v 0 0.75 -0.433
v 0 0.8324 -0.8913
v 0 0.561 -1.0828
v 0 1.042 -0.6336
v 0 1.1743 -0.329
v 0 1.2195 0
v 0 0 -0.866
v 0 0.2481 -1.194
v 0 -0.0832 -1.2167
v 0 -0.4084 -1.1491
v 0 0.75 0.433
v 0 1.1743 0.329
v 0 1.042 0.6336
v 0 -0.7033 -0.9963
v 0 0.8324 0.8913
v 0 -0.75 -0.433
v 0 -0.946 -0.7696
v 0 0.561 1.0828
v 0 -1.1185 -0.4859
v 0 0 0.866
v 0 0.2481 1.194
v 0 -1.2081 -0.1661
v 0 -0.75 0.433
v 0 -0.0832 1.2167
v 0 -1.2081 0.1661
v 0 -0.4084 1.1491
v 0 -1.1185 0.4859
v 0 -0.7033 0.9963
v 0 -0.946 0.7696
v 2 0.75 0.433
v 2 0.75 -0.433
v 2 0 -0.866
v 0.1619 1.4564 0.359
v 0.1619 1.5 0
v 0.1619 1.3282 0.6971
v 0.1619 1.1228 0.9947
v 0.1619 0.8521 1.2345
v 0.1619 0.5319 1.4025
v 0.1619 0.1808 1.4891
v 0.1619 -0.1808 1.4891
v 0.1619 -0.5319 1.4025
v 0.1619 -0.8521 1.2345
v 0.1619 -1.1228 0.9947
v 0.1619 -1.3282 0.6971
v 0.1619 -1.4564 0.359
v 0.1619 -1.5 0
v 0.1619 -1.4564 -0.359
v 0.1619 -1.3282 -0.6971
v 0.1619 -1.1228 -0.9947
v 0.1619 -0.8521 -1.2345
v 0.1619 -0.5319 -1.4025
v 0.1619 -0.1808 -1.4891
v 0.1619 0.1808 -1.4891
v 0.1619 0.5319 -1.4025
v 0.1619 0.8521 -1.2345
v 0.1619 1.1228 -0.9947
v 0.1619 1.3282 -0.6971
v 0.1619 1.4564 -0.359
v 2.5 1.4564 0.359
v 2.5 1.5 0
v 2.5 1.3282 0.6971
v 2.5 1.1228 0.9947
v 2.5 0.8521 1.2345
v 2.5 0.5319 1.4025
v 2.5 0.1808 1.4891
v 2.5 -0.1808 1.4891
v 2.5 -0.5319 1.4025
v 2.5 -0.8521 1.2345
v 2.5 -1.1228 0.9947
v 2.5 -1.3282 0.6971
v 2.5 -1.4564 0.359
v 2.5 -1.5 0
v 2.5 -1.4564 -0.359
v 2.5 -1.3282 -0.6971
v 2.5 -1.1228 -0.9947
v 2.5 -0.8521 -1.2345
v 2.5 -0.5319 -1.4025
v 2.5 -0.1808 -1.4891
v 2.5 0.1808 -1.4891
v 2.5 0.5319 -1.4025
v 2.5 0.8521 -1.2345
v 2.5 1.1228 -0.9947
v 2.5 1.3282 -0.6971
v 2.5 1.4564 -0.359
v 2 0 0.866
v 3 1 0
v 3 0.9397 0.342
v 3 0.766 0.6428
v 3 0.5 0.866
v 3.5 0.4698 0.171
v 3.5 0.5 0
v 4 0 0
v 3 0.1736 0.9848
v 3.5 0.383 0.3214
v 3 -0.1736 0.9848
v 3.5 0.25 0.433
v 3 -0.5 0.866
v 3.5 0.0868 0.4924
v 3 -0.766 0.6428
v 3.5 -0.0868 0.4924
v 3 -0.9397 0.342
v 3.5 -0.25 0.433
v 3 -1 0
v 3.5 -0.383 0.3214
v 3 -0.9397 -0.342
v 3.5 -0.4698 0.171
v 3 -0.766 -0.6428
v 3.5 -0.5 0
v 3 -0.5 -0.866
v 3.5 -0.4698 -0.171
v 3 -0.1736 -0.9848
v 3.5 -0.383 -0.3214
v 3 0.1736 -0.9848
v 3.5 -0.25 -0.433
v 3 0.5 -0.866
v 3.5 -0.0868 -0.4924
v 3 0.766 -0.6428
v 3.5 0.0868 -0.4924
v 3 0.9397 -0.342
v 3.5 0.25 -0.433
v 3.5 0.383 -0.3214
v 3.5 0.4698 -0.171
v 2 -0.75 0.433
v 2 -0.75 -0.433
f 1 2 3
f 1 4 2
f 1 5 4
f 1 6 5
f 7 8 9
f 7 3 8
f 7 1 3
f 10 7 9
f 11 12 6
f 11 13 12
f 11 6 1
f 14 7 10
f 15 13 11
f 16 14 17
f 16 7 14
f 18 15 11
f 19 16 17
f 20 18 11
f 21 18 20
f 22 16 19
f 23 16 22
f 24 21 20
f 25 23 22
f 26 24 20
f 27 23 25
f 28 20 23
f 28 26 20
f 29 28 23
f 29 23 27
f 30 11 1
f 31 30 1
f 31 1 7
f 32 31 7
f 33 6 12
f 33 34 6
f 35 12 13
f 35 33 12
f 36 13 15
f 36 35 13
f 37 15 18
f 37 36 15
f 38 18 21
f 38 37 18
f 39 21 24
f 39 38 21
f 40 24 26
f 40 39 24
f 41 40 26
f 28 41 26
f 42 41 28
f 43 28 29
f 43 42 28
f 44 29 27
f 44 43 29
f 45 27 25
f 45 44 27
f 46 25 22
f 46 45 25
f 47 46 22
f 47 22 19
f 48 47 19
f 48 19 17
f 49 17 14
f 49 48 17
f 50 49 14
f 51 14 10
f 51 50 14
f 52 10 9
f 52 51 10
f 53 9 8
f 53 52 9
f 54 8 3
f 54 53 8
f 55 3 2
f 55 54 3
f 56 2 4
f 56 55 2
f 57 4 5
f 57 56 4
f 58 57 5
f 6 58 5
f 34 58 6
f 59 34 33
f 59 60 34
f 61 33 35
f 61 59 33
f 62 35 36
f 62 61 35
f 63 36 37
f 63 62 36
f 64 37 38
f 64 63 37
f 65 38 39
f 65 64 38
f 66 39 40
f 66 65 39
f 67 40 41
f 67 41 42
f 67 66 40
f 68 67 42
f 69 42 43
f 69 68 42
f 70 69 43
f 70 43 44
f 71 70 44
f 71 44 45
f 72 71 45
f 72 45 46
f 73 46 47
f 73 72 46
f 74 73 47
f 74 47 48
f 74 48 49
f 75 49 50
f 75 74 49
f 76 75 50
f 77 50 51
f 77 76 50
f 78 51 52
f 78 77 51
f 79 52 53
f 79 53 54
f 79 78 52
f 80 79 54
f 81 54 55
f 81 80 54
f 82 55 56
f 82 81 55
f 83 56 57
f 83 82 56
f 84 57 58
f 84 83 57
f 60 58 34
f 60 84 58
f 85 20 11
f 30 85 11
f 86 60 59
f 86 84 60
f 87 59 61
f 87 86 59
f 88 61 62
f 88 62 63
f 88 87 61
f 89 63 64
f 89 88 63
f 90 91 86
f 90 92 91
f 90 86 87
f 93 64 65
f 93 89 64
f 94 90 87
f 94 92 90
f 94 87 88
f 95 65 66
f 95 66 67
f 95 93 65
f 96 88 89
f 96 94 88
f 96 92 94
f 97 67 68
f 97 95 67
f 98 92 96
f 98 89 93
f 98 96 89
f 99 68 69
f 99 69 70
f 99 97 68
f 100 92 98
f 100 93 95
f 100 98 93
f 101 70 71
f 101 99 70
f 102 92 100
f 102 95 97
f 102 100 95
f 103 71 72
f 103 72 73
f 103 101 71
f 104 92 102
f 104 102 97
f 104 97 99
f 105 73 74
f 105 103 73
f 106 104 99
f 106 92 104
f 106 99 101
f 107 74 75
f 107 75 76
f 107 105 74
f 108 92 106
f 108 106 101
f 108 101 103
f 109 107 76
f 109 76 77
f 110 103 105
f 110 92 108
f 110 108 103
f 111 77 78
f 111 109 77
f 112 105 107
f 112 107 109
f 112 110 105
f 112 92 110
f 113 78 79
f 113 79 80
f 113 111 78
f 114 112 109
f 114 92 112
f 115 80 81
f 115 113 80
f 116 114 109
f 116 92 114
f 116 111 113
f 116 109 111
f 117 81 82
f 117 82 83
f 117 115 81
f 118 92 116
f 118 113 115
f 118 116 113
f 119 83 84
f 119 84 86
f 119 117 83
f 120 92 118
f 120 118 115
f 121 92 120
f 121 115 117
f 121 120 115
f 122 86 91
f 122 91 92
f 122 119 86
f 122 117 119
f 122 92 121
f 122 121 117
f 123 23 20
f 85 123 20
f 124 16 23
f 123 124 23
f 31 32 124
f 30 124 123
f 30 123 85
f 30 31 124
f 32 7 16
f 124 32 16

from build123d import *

# Parameters (mm, degrees)
HEX_2_DEPTH = 2


with BuildPart() as part:
    # BodySke → BaseBody (revolve)
    with BuildSketch(Plane.XY):
        Polygon((0, 0), (0, 1.2195), (0.161946751, 1.5), (2.5, 1.5), (4, 0), align=None)
    revolve(axis=Axis((-12.7, 0, 0), (1, 0, 0)))

    # Sketch2 → Hex 2 (cut)
    with BuildSketch(Plane.ZY):
        Polygon((0.433012702, 0.75), (-0.433012702, 0.75), (-0.866025404, 0), (-0.433012702, -0.75), (0.433012702, -0.75), (0.866025404, 0), align=None)
    extrude(amount=-HEX_2_DEPTH, mode=Mode.SUBTRACT)


solid = part.part
